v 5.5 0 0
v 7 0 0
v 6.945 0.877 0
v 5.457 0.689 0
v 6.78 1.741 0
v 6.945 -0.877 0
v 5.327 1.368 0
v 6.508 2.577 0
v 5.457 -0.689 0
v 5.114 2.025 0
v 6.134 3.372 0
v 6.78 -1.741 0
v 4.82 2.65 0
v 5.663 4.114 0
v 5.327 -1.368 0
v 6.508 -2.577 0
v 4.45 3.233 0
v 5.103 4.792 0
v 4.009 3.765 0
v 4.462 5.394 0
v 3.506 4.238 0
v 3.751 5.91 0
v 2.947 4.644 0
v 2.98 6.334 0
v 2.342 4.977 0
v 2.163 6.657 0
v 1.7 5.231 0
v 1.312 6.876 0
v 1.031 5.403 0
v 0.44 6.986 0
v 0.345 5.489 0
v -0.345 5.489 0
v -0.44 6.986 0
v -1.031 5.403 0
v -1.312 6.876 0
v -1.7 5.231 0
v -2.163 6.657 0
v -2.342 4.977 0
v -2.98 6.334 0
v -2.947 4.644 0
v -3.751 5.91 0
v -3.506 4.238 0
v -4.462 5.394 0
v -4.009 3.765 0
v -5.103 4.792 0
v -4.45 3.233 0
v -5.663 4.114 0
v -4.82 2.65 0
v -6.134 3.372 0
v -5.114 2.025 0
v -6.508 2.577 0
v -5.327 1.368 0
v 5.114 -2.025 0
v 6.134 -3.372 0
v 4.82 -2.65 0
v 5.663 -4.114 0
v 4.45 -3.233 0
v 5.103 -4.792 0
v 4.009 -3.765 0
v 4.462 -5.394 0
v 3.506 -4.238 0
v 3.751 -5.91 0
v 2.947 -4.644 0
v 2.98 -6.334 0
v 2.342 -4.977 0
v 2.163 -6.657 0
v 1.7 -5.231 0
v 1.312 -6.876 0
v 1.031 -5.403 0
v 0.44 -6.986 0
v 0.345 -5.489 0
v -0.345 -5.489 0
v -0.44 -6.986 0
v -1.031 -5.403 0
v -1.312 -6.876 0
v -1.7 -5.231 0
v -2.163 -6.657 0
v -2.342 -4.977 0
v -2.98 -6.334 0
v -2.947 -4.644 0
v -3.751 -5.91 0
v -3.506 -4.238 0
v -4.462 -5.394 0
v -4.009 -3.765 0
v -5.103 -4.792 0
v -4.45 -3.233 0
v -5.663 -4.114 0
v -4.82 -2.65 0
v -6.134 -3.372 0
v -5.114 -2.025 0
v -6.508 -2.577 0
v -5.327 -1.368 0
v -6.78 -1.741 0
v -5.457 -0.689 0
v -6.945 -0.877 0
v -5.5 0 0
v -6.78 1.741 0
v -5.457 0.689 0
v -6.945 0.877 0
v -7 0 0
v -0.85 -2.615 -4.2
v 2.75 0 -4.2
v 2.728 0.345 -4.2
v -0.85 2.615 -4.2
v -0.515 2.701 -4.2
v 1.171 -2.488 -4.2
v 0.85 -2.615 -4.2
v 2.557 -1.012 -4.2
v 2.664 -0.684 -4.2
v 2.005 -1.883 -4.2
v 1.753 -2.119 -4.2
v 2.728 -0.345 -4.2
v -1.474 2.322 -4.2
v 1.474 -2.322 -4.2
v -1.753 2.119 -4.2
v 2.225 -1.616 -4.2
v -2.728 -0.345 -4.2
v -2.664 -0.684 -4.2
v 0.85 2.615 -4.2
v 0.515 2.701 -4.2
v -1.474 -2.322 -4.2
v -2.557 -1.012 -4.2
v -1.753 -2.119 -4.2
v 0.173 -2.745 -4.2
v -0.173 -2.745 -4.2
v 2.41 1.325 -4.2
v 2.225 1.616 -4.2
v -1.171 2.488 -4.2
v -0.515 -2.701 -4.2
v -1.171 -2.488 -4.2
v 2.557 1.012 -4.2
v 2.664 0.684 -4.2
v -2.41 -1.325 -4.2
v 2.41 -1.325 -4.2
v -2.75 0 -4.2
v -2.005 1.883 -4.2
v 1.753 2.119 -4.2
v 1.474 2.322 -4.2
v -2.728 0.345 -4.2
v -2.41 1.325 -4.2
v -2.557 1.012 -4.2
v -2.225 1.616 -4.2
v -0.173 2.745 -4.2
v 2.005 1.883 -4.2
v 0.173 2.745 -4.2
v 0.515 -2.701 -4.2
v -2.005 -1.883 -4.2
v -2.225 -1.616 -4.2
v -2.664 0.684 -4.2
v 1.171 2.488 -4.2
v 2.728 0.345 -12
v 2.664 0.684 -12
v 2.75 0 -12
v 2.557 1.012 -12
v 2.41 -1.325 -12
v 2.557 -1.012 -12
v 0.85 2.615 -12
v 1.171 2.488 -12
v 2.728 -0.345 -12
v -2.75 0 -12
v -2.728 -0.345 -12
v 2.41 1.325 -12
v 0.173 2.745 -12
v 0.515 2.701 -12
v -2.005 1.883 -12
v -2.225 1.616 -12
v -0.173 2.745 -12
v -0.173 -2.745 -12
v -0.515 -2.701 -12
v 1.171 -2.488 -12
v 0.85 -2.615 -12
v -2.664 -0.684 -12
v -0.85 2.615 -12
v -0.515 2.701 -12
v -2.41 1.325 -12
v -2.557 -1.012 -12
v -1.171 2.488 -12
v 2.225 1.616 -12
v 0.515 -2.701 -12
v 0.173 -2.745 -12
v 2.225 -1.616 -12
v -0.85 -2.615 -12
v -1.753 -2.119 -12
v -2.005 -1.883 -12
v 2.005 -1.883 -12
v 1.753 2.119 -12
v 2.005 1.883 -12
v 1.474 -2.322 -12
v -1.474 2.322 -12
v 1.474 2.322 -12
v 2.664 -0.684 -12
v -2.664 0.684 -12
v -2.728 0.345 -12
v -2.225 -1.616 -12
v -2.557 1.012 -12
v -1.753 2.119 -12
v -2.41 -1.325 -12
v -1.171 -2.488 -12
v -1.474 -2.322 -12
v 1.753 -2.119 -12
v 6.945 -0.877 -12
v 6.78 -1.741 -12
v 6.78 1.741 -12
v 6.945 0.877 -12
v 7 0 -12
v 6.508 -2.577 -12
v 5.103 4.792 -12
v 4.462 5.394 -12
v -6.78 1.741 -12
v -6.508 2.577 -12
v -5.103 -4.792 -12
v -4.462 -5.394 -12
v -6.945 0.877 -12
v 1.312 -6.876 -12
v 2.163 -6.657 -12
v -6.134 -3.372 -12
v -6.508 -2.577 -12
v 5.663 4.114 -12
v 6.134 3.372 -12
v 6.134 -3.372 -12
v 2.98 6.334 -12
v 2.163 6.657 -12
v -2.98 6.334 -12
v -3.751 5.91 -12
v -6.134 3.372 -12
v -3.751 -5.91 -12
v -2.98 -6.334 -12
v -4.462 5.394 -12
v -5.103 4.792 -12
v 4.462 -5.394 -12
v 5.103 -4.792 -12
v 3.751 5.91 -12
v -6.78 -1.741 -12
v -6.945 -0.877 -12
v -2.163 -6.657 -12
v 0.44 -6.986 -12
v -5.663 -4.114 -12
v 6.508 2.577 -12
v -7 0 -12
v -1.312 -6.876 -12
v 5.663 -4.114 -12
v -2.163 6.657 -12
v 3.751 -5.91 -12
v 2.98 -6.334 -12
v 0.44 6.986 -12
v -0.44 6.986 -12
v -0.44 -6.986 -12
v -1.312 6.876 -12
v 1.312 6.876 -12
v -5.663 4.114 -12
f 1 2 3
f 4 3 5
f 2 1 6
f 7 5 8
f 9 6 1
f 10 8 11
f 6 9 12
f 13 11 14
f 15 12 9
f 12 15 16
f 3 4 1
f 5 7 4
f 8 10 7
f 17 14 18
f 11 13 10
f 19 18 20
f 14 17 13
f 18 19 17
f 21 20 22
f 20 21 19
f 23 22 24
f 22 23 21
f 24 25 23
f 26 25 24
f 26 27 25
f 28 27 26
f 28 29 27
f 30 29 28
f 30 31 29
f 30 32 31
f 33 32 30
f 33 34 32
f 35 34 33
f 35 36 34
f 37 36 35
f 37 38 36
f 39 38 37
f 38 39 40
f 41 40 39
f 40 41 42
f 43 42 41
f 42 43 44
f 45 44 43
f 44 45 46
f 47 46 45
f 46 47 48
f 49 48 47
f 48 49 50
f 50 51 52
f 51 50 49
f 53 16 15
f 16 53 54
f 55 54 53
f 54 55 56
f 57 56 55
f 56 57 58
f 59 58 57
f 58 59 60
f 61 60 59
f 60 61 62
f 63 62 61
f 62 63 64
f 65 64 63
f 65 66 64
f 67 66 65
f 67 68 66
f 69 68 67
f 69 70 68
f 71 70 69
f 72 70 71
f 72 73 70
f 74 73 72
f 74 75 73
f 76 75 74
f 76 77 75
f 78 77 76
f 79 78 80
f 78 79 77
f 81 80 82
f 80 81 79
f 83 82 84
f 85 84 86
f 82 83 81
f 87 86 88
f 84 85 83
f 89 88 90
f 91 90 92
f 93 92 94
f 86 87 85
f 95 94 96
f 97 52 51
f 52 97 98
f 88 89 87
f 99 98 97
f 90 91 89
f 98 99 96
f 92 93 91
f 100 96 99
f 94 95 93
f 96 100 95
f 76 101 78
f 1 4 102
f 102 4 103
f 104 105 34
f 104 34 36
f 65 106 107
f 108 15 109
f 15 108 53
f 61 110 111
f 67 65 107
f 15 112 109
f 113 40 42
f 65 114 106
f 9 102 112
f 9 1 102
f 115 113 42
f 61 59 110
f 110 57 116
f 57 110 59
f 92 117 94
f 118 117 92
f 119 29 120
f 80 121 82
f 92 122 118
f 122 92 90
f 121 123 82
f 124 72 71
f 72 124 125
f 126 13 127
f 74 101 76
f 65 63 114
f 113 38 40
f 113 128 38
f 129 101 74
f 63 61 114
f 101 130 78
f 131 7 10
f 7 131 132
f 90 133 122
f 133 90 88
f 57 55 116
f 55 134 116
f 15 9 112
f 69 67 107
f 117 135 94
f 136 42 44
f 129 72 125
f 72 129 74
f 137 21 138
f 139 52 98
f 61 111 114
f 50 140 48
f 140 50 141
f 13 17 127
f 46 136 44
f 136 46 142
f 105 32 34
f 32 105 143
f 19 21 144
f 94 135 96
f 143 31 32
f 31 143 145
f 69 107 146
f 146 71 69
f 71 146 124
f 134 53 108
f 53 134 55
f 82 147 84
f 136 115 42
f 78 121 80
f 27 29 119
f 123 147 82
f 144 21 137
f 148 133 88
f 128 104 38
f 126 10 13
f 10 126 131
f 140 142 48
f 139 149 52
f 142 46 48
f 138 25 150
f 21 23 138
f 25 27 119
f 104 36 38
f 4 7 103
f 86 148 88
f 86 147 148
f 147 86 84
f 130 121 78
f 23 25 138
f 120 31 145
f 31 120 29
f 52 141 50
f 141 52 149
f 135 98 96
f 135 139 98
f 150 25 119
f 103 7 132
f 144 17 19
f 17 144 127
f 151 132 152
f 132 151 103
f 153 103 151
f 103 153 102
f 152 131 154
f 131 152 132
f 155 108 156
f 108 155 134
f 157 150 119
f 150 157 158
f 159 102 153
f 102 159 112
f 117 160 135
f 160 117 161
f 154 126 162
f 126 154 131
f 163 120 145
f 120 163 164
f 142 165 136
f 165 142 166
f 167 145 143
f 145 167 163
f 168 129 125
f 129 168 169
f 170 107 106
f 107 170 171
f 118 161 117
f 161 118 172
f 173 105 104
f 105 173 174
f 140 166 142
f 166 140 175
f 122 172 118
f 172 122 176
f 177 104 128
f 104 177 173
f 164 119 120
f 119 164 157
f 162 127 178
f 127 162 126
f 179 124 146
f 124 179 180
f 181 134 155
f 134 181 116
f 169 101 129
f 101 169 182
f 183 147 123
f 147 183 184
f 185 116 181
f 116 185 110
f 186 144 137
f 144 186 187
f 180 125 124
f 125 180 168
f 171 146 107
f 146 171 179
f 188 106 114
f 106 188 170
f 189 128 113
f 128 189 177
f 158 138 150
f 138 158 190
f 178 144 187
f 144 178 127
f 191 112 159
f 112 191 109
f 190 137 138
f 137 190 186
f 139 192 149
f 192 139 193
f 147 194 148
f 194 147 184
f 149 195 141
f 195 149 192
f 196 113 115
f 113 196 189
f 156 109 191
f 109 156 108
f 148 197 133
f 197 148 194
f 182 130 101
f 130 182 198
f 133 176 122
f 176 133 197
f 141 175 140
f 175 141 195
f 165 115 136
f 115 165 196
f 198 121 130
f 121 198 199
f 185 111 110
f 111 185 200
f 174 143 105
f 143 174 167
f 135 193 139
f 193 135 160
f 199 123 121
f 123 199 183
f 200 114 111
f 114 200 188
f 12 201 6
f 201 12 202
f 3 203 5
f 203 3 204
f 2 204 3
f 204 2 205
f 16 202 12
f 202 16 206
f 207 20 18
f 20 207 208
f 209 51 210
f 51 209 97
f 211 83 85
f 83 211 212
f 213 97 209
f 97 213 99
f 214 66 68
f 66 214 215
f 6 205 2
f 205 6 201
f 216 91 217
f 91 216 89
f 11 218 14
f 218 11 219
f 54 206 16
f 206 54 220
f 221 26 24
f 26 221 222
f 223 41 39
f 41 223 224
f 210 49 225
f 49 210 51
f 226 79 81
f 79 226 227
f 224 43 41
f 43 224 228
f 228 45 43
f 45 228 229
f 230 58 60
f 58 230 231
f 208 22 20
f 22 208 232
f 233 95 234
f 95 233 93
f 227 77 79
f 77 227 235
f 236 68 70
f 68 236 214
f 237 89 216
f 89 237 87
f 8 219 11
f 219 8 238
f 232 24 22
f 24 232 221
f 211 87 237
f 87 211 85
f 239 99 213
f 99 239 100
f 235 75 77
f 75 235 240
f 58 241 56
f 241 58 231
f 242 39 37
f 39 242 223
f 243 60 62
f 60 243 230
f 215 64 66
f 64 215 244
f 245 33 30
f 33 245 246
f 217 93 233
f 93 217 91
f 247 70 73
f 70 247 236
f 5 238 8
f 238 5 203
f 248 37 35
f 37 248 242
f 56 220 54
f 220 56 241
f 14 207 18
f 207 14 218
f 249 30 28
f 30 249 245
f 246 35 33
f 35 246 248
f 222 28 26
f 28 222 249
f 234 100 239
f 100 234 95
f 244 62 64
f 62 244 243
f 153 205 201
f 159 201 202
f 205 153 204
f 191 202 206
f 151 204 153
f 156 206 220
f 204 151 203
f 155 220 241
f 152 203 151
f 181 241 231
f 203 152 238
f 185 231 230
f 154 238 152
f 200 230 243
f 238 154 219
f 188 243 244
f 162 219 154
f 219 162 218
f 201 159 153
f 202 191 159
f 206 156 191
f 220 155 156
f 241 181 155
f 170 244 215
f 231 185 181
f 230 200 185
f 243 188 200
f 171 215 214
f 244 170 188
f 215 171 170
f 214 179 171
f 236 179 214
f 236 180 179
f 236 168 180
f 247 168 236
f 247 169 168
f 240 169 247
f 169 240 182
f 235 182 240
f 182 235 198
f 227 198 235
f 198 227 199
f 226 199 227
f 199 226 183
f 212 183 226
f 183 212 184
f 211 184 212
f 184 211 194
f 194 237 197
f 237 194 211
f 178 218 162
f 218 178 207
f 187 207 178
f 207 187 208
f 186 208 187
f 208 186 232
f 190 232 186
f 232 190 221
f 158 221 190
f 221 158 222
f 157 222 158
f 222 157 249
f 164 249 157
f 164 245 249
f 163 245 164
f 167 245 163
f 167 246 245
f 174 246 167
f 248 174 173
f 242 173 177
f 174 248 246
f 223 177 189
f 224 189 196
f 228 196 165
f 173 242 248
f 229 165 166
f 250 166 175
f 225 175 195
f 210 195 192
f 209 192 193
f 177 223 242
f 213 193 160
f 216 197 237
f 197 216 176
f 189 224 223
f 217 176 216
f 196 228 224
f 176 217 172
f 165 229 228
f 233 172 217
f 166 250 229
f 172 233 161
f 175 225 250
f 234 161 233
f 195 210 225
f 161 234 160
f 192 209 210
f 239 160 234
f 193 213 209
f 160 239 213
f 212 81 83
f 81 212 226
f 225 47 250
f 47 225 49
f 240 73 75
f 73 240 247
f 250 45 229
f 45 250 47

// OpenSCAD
$fn = 50;

difference() {
	union() {
		translate(v = [0, 0, -12.0]) {
			cylinder(h = 12, r = 7.0);
		}
	}
	union() {
		translate(v = [0, 0, 0]) {
			rotate(a = [0, 0, 0]) {
				difference() {
					union() {
						translate(v = [0, 0, -15.0]) {
							cylinder(h = 15, r = 2.25);
						}
						translate(v = [0, 0, -4.2]) {
							cylinder(h = 4.2, r1 = 2.75, r2 = 5.5);
						}
						translate(v = [0, 0, -15.0]) {
							cylinder(h = 15, r = 2.75);
						}
						translate(v = [0, 0, -15.0]) {
							cylinder(h = 15, r = 2.25);
						}
					}
					union();
				}
			}
		}
	}
}
